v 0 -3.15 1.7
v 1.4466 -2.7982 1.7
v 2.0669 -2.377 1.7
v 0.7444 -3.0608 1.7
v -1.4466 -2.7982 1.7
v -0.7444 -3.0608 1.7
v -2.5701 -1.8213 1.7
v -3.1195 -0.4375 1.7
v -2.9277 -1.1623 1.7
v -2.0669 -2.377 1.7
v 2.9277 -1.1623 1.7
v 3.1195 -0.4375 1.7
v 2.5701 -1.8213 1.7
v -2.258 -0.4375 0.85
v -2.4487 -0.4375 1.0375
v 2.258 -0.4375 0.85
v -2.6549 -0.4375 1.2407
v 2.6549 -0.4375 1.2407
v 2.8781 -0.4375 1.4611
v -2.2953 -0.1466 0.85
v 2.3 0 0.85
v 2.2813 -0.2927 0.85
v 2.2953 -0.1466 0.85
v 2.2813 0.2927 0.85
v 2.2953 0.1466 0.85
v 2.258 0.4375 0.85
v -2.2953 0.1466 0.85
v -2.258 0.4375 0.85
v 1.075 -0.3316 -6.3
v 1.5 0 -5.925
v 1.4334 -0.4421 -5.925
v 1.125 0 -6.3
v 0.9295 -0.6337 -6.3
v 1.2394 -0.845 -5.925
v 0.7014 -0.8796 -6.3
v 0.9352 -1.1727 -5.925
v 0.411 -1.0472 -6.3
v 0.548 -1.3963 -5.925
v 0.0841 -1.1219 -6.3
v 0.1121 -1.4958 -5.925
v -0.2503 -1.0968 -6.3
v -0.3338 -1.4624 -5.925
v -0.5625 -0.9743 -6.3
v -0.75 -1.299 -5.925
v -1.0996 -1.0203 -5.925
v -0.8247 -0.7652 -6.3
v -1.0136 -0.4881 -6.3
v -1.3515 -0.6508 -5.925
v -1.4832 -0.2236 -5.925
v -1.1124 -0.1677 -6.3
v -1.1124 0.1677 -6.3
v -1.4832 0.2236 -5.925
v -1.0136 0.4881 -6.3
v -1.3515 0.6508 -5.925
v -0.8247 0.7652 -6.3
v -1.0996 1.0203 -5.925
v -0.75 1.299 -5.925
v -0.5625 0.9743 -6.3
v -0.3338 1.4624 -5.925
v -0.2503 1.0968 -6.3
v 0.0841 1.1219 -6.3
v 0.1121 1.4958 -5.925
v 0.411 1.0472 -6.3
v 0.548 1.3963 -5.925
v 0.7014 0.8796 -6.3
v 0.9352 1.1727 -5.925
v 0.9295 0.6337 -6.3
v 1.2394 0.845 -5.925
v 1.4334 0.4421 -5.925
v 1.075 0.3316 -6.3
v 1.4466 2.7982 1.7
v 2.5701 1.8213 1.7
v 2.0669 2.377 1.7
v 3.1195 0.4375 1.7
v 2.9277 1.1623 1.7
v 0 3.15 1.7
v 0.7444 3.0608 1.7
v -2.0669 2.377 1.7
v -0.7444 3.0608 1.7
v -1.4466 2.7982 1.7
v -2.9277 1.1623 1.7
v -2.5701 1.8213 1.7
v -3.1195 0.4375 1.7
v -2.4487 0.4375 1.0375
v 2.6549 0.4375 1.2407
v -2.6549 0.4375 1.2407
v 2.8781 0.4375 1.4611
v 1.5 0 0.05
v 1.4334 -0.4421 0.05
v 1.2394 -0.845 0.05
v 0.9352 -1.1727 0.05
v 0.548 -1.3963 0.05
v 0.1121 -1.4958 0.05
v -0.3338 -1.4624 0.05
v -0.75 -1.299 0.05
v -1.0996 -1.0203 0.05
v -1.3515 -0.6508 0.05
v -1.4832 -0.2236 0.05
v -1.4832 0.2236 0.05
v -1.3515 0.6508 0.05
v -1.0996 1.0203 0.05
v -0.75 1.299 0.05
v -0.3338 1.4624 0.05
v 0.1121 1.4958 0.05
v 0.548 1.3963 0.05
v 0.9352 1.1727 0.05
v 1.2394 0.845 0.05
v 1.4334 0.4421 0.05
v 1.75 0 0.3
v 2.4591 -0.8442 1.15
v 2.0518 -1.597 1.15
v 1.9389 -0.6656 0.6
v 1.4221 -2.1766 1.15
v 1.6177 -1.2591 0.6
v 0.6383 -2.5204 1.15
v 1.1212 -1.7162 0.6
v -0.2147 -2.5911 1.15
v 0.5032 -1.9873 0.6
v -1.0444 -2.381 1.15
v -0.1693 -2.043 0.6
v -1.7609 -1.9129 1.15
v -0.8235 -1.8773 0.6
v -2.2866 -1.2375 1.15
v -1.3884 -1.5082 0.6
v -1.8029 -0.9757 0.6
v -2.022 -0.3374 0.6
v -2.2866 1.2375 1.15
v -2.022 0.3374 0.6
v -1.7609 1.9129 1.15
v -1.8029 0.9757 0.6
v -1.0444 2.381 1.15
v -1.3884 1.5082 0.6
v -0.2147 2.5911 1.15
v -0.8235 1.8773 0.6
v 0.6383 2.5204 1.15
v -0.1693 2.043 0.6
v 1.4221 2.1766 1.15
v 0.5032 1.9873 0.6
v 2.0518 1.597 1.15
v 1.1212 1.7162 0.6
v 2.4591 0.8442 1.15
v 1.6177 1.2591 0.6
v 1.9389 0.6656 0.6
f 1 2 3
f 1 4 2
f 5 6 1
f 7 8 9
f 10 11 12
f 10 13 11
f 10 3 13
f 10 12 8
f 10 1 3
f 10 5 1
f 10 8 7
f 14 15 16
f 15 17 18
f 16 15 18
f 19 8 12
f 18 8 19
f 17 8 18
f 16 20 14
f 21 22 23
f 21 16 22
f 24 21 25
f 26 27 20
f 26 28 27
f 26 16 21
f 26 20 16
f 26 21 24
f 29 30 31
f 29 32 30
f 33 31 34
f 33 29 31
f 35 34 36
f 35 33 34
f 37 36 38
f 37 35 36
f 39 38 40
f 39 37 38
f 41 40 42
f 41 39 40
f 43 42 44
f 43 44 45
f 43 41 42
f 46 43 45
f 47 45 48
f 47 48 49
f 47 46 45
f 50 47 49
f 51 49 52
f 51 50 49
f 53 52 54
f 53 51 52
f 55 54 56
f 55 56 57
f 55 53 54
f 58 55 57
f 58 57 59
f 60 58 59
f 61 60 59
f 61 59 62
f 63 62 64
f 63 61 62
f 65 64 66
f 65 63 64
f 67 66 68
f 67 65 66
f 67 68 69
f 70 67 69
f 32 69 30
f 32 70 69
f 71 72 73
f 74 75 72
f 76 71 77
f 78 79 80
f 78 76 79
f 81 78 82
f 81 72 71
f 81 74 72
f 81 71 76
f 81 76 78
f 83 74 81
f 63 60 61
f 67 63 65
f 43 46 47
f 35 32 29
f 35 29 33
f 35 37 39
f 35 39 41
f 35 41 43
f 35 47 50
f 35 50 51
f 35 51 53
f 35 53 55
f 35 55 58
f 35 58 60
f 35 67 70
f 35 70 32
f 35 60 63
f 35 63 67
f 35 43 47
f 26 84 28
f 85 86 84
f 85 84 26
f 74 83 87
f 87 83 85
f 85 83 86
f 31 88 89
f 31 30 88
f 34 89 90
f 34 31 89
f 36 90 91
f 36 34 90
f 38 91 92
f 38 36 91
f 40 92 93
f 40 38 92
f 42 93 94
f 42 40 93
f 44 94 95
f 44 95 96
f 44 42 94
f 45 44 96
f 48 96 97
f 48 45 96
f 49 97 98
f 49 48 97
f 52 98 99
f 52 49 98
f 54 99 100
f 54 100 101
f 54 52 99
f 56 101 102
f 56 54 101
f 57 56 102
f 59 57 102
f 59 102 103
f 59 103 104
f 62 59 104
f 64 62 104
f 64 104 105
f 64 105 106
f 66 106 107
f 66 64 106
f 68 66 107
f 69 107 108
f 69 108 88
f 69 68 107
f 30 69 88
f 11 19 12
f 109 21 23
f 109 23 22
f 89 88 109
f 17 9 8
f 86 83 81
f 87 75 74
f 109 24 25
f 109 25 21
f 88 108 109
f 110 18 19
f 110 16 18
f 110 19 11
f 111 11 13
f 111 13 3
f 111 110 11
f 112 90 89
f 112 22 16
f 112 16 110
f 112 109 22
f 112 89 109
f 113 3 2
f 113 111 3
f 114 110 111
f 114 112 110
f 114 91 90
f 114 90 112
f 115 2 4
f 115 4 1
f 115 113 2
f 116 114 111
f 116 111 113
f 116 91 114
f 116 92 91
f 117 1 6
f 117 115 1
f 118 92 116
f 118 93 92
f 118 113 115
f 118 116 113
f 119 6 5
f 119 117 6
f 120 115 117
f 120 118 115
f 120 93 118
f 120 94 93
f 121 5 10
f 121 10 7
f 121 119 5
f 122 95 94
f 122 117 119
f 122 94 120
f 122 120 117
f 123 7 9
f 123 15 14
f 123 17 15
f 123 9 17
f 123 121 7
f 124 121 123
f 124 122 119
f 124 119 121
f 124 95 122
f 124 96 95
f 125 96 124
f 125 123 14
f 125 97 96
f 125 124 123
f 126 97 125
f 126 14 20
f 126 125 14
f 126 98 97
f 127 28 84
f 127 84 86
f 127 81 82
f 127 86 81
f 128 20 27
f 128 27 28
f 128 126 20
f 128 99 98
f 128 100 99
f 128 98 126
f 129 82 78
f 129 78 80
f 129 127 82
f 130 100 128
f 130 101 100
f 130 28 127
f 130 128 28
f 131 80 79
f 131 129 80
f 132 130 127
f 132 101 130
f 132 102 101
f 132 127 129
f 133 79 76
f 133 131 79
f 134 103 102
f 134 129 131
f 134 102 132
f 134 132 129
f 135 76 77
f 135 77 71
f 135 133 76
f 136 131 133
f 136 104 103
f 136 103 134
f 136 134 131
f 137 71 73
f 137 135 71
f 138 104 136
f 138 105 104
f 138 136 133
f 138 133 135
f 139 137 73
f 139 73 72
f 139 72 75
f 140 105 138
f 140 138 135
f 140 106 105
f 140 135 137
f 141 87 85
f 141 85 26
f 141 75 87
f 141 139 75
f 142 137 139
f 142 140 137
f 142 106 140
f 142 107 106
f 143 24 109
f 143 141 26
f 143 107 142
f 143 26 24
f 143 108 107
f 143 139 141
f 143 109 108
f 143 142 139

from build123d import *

# Parameters (mm, degrees)
SKETCH9_W          = 6.3
SKETCH9_H          = 0.875
CUT_EXTRUDE1_DEPTH = 0.85


with BuildPart() as part:
    # Sketch3 → Revolve1 (revolve)
    with BuildSketch(Plane(origin=(0, 0, 0), x_dir=(0, 0, -1), z_dir=(1, 0, 0))):
        Polygon((-1.7, 3.15), (-0.05, 1.5), (5.925, 1.5), (6.3, 1.125), (6.3, 0), (-1.7, 0), align=None)
    revolve(axis=Axis((0, 0, 1.7), (0, 0, -1)))

    # Sketch9 → Cut-Extrude1 (cut)
    with BuildSketch(Plane.XY.offset(1.7)):
        Rectangle(SKETCH9_W, SKETCH9_H)
    extrude(amount=-CUT_EXTRUDE1_DEPTH, mode=Mode.SUBTRACT)


solid = part.part
